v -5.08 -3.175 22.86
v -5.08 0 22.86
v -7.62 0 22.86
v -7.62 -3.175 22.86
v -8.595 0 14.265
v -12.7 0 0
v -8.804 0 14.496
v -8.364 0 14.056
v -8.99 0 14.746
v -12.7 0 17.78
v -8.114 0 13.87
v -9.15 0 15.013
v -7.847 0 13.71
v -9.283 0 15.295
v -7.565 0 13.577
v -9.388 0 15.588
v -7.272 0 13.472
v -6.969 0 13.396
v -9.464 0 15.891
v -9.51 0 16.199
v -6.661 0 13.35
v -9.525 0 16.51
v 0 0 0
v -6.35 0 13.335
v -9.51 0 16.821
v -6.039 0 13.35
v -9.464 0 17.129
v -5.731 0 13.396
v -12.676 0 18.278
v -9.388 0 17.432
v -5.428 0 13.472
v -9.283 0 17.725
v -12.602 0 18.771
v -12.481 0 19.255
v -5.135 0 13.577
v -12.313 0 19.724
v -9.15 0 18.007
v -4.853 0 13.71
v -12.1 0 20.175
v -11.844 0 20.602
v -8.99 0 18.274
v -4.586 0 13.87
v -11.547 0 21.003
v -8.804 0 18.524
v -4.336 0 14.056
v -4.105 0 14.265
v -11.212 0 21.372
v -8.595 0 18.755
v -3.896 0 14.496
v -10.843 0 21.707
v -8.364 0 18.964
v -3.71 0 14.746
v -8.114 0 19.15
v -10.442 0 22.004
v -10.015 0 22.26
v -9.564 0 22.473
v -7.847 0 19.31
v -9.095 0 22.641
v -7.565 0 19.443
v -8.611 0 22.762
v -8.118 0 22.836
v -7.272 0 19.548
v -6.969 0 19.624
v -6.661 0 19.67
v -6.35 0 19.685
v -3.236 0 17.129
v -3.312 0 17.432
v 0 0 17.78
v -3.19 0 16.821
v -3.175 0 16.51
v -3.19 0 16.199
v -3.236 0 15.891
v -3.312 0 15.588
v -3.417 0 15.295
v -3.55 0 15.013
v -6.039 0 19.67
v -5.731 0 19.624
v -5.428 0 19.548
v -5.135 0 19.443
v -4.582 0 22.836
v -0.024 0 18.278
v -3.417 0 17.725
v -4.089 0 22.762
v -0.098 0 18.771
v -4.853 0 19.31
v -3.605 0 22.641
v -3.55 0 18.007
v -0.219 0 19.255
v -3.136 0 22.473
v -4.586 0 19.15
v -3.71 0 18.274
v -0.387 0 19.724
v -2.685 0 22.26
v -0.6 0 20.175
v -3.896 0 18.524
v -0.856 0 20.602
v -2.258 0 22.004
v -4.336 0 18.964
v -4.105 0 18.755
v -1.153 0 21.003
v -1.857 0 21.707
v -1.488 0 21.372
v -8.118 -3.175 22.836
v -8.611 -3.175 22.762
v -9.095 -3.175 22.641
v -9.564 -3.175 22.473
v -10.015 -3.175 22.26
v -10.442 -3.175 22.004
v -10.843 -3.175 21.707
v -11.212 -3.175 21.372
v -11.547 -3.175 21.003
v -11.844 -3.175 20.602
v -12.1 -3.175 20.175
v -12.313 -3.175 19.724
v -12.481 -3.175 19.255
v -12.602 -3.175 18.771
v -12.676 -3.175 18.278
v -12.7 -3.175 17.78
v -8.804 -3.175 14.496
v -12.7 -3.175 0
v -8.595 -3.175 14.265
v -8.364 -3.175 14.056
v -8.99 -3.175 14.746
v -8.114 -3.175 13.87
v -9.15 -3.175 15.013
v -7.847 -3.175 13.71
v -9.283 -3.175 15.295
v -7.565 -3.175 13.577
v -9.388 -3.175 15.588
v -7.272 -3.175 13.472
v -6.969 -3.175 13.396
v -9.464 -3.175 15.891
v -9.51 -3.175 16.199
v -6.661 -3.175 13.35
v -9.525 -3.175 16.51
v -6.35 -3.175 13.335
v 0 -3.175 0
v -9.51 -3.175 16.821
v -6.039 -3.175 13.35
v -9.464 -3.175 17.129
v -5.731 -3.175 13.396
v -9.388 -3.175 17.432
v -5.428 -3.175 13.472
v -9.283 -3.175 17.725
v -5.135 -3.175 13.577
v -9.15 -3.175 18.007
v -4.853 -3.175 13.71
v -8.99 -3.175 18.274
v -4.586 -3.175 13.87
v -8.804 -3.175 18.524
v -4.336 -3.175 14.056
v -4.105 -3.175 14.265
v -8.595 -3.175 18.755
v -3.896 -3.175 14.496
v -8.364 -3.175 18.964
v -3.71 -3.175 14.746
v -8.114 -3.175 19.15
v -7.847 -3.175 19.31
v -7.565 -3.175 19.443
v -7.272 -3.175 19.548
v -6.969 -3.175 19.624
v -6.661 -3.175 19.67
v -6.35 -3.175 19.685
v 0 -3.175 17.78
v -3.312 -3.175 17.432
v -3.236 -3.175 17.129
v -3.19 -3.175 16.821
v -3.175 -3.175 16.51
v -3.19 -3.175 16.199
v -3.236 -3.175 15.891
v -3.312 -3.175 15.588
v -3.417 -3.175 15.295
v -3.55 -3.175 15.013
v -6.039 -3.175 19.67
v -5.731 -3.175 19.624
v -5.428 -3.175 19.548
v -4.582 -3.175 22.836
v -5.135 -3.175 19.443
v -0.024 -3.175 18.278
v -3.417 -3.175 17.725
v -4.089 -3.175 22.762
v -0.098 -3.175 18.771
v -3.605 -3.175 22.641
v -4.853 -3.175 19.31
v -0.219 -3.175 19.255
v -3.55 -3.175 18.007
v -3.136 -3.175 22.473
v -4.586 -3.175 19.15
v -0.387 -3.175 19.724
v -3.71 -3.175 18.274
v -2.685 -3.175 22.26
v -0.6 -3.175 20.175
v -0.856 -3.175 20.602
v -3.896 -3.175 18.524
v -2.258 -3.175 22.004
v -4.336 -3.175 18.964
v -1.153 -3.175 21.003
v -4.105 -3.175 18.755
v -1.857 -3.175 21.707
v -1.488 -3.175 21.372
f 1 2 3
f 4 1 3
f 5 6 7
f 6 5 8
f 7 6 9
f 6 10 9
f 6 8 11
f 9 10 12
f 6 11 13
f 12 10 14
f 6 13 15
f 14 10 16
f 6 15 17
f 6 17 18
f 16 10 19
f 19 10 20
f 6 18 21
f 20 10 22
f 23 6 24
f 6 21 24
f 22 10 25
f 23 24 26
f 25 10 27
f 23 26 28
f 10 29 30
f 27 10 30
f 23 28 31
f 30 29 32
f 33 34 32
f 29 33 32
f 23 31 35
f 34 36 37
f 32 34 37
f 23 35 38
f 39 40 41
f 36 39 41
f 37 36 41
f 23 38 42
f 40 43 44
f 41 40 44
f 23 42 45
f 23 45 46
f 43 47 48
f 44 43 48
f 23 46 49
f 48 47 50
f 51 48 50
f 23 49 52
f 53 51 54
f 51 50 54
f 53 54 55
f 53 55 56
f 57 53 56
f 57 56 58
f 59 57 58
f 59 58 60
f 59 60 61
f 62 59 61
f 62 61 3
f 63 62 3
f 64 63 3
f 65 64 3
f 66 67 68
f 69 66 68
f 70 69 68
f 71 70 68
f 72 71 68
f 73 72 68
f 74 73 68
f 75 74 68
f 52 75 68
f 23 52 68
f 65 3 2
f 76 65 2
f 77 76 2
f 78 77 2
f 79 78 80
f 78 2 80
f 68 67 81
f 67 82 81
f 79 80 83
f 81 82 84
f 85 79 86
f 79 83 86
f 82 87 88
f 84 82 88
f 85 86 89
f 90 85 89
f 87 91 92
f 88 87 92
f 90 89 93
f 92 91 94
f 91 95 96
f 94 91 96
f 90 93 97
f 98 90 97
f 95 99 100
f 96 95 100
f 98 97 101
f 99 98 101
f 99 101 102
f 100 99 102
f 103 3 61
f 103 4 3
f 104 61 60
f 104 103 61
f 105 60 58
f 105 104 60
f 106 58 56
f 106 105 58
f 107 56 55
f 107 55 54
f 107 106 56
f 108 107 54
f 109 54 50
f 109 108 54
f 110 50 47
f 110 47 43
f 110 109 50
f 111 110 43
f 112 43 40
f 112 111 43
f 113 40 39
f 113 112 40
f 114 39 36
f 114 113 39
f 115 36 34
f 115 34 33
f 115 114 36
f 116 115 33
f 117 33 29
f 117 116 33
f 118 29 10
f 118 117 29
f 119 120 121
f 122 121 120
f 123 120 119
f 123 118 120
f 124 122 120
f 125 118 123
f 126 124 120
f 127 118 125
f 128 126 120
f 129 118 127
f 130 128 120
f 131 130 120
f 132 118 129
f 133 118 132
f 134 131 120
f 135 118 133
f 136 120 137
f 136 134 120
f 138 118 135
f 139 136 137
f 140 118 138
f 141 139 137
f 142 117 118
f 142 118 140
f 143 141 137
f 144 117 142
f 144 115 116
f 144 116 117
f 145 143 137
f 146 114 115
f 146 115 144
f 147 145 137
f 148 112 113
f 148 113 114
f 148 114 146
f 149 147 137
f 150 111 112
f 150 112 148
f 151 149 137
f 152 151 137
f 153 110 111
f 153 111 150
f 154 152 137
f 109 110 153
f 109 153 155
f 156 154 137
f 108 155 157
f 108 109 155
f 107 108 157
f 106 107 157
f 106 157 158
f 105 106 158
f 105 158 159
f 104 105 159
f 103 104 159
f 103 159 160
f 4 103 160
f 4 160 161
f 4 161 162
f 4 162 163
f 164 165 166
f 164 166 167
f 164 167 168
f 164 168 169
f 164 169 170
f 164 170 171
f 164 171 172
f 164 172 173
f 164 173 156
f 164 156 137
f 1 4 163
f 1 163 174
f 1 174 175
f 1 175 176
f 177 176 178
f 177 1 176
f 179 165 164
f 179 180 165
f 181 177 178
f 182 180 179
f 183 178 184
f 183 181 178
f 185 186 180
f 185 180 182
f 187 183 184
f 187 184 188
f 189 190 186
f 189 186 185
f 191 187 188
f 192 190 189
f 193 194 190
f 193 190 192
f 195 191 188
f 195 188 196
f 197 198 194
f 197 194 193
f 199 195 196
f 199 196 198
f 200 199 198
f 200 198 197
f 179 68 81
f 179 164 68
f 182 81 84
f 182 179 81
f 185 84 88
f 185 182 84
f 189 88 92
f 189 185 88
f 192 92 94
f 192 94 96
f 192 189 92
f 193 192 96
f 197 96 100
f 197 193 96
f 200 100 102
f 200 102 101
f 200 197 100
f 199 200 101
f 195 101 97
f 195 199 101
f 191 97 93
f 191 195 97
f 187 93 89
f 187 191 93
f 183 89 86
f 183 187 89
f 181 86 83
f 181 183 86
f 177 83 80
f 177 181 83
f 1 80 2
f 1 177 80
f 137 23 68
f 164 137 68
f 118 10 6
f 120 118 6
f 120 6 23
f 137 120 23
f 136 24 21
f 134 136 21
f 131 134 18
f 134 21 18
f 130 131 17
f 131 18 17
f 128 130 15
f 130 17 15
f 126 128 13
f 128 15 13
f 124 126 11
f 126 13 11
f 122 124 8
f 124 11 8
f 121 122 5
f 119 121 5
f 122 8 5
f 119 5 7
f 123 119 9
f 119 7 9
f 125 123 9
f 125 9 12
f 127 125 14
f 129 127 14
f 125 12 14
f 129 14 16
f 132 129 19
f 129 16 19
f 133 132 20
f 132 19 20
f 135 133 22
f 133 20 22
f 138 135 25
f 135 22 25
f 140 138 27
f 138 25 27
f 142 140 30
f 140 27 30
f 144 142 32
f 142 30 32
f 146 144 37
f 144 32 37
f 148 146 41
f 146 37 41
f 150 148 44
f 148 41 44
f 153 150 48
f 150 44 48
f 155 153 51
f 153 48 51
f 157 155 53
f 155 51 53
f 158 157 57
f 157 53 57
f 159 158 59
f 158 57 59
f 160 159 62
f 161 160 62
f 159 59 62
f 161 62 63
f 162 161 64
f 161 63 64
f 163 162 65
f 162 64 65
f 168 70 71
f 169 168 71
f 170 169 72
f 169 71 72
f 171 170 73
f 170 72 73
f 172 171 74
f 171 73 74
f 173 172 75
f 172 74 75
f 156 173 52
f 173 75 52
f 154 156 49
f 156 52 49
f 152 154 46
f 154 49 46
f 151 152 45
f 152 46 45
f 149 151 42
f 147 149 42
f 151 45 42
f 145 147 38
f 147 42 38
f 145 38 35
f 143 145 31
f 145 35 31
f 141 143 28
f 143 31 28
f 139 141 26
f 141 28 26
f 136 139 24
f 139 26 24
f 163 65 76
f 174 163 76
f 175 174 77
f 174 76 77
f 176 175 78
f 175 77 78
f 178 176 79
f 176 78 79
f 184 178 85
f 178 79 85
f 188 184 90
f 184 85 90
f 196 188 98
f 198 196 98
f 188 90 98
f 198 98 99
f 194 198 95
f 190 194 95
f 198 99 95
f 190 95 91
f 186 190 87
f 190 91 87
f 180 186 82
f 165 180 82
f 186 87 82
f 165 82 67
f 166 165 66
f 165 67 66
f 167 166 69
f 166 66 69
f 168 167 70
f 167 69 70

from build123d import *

# Parameters (mm, degrees)
F1_DEPTH = 3.175
F2_R     = 5.08
F3_R     = 5.08


with BuildPart() as f1:
    # F0 (on Front) → F1 (new body)
    with BuildSketch(Plane.XZ):
        with BuildLine():
            Line((-6.35, 0), (0, 0))
            Line((0, 0), (0, 22.86))
            Line((0, 22.86), (-6.35, 22.86))
            Line((-6.35, 22.86), (-6.35, 19.685))
            ThreePointArc((-6.35, 19.685), (-4.104936, 18.755064), (-3.175, 16.51))
            ThreePointArc((-3.175, 16.51), (-4.104936, 14.264936), (-6.35, 13.335))
            Line((-6.35, 13.335), (-6.35, 0))
        make_face()
        with BuildLine():
            Line((-12.7, 0), (-6.35, 0))
            Line((-6.35, 0), (-6.35, 13.335))
            ThreePointArc((-6.35, 13.335), (-9.525, 16.51), (-6.35, 19.685))
            Line((-6.35, 19.685), (-6.35, 22.86))
            Line((-6.35, 22.86), (-12.7, 22.86))
            Line((-12.7, 22.86), (-12.7, 0))
        make_face()
    extrude(amount=F1_DEPTH)

    # F2
    f2_edges = [f1.edges().sort_by_distance(p)[0] for p in [
        (0, -1.5875, 22.86),
    ]]
    fillet(f2_edges, radius=F2_R)

    # F3
    f3_edges = [f1.edges().sort_by_distance(p)[0] for p in [
        (-12.7, -1.5875, 22.86),
    ]]
    fillet(f3_edges, radius=F3_R)


solid = f1.part
